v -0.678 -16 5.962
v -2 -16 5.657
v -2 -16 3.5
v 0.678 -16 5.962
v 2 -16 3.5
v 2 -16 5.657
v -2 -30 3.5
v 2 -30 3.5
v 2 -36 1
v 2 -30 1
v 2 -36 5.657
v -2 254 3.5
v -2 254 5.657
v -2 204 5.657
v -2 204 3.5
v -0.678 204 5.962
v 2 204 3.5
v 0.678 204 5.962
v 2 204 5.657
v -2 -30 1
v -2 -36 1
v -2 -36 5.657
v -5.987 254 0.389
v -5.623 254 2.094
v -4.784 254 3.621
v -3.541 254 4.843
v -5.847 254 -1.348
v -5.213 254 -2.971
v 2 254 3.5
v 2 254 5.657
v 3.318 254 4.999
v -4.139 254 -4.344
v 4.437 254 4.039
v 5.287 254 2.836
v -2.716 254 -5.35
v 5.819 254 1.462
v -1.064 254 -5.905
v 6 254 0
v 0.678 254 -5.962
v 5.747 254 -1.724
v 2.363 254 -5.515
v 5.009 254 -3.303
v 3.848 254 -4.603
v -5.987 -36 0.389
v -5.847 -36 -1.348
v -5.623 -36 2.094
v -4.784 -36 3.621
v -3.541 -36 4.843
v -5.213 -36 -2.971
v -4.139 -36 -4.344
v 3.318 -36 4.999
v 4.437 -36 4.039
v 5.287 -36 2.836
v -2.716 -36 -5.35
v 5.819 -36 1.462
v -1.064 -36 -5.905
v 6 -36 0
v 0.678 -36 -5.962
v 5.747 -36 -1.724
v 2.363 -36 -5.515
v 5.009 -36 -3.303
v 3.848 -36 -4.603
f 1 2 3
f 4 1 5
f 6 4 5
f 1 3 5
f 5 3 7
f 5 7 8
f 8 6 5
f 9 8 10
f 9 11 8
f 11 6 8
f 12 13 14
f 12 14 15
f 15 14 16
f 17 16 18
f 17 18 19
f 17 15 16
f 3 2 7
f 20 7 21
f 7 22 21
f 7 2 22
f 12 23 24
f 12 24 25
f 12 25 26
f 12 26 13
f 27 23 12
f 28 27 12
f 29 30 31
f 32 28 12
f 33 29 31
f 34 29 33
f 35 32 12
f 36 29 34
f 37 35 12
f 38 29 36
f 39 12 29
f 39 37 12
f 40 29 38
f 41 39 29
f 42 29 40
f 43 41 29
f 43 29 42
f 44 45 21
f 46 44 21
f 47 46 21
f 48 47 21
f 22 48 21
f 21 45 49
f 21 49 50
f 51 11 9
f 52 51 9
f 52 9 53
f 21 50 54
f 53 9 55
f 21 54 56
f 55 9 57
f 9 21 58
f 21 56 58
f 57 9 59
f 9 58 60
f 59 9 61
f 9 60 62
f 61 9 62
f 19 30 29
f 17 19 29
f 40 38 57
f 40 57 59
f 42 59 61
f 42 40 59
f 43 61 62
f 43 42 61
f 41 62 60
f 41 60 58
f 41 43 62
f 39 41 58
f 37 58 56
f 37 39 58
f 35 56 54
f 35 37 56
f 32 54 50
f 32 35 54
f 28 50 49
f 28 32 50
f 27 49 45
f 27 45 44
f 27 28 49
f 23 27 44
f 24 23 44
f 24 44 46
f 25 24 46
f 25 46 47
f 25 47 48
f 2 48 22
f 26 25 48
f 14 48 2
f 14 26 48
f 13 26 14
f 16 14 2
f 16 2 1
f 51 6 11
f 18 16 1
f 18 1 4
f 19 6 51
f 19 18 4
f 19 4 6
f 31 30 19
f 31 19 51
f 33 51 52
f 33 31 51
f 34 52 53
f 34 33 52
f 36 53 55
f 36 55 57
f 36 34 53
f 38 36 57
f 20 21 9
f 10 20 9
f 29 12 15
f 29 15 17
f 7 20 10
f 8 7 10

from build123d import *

# Parameters (mm, degrees)
SKETCH1_R                = 6
BOSS_EXTRUDE1_DEPTH      = 254
BOSS_EXTRUDE1_DEPTH_BACK = 36
CUT_EXTRUDE3_START       = -36
SKETCH2_W                = 4
SKETCH2_H                = 5
CUT_EXTRUDE3_DEPTH       = 20
CUT_EXTRUDE3_DEPTH_BACK  = 0.0001
CUT_EXTRUDE4_START       = 254
SKETCH2_2_W              = 4
SKETCH2_2_H              = 5
CUT_EXTRUDE4_DEPTH       = 50
CUT_EXTRUDE6_START       = -36
SKETCH3_W                = 4
SKETCH3_H                = 10
CUT_EXTRUDE6_DEPTH       = 6


with BuildPart() as part:
    # Sketch1 → Boss-Extrude1 (new body, two sides)
    with BuildSketch(Plane(origin=(0, 0, 0), x_dir=(1, 0, 0), z_dir=(0, 1, 0))) as boss_extrude1_sk:
        Circle(SKETCH1_R)
    extrude(amount=BOSS_EXTRUDE1_DEPTH)
    extrude(boss_extrude1_sk.sketch, amount=-BOSS_EXTRUDE1_DEPTH_BACK)

    # Sketch2 → Cut-Extrude3 (cut, two sides)
    with BuildSketch(Plane(origin=(0, 0, 0), x_dir=(1, 0, 0), z_dir=(0, 1, 0)).offset(CUT_EXTRUDE3_START)) as cut_extrude3_sk:
        with Locations((0, -6)):
            Rectangle(SKETCH2_W, SKETCH2_H)
    extrude(amount=CUT_EXTRUDE3_DEPTH, mode=Mode.SUBTRACT)
    extrude(cut_extrude3_sk.sketch, amount=-CUT_EXTRUDE3_DEPTH_BACK, mode=Mode.SUBTRACT)

    # Sketch2<2> → Cut-Extrude4 (cut)
    with BuildSketch(Plane(origin=(0, 0, 0), x_dir=(1, 0, 0), z_dir=(0, 1, 0)).offset(CUT_EXTRUDE4_START)):
        with Locations((0, -6)):
            Rectangle(SKETCH2_2_W, SKETCH2_2_H)
    extrude(amount=-CUT_EXTRUDE4_DEPTH, mode=Mode.SUBTRACT)

    # Sketch3 → Cut-Extrude6 (cut)
    with BuildSketch(Plane(origin=(0, 0, 0), x_dir=(1, 0, 0), z_dir=(0, 1, 0)).offset(CUT_EXTRUDE6_START)):
        with Locations((0, -6)):
            Rectangle(SKETCH3_W, SKETCH3_H)
    extrude(amount=CUT_EXTRUDE6_DEPTH, mode=Mode.SUBTRACT)


solid = part.part
